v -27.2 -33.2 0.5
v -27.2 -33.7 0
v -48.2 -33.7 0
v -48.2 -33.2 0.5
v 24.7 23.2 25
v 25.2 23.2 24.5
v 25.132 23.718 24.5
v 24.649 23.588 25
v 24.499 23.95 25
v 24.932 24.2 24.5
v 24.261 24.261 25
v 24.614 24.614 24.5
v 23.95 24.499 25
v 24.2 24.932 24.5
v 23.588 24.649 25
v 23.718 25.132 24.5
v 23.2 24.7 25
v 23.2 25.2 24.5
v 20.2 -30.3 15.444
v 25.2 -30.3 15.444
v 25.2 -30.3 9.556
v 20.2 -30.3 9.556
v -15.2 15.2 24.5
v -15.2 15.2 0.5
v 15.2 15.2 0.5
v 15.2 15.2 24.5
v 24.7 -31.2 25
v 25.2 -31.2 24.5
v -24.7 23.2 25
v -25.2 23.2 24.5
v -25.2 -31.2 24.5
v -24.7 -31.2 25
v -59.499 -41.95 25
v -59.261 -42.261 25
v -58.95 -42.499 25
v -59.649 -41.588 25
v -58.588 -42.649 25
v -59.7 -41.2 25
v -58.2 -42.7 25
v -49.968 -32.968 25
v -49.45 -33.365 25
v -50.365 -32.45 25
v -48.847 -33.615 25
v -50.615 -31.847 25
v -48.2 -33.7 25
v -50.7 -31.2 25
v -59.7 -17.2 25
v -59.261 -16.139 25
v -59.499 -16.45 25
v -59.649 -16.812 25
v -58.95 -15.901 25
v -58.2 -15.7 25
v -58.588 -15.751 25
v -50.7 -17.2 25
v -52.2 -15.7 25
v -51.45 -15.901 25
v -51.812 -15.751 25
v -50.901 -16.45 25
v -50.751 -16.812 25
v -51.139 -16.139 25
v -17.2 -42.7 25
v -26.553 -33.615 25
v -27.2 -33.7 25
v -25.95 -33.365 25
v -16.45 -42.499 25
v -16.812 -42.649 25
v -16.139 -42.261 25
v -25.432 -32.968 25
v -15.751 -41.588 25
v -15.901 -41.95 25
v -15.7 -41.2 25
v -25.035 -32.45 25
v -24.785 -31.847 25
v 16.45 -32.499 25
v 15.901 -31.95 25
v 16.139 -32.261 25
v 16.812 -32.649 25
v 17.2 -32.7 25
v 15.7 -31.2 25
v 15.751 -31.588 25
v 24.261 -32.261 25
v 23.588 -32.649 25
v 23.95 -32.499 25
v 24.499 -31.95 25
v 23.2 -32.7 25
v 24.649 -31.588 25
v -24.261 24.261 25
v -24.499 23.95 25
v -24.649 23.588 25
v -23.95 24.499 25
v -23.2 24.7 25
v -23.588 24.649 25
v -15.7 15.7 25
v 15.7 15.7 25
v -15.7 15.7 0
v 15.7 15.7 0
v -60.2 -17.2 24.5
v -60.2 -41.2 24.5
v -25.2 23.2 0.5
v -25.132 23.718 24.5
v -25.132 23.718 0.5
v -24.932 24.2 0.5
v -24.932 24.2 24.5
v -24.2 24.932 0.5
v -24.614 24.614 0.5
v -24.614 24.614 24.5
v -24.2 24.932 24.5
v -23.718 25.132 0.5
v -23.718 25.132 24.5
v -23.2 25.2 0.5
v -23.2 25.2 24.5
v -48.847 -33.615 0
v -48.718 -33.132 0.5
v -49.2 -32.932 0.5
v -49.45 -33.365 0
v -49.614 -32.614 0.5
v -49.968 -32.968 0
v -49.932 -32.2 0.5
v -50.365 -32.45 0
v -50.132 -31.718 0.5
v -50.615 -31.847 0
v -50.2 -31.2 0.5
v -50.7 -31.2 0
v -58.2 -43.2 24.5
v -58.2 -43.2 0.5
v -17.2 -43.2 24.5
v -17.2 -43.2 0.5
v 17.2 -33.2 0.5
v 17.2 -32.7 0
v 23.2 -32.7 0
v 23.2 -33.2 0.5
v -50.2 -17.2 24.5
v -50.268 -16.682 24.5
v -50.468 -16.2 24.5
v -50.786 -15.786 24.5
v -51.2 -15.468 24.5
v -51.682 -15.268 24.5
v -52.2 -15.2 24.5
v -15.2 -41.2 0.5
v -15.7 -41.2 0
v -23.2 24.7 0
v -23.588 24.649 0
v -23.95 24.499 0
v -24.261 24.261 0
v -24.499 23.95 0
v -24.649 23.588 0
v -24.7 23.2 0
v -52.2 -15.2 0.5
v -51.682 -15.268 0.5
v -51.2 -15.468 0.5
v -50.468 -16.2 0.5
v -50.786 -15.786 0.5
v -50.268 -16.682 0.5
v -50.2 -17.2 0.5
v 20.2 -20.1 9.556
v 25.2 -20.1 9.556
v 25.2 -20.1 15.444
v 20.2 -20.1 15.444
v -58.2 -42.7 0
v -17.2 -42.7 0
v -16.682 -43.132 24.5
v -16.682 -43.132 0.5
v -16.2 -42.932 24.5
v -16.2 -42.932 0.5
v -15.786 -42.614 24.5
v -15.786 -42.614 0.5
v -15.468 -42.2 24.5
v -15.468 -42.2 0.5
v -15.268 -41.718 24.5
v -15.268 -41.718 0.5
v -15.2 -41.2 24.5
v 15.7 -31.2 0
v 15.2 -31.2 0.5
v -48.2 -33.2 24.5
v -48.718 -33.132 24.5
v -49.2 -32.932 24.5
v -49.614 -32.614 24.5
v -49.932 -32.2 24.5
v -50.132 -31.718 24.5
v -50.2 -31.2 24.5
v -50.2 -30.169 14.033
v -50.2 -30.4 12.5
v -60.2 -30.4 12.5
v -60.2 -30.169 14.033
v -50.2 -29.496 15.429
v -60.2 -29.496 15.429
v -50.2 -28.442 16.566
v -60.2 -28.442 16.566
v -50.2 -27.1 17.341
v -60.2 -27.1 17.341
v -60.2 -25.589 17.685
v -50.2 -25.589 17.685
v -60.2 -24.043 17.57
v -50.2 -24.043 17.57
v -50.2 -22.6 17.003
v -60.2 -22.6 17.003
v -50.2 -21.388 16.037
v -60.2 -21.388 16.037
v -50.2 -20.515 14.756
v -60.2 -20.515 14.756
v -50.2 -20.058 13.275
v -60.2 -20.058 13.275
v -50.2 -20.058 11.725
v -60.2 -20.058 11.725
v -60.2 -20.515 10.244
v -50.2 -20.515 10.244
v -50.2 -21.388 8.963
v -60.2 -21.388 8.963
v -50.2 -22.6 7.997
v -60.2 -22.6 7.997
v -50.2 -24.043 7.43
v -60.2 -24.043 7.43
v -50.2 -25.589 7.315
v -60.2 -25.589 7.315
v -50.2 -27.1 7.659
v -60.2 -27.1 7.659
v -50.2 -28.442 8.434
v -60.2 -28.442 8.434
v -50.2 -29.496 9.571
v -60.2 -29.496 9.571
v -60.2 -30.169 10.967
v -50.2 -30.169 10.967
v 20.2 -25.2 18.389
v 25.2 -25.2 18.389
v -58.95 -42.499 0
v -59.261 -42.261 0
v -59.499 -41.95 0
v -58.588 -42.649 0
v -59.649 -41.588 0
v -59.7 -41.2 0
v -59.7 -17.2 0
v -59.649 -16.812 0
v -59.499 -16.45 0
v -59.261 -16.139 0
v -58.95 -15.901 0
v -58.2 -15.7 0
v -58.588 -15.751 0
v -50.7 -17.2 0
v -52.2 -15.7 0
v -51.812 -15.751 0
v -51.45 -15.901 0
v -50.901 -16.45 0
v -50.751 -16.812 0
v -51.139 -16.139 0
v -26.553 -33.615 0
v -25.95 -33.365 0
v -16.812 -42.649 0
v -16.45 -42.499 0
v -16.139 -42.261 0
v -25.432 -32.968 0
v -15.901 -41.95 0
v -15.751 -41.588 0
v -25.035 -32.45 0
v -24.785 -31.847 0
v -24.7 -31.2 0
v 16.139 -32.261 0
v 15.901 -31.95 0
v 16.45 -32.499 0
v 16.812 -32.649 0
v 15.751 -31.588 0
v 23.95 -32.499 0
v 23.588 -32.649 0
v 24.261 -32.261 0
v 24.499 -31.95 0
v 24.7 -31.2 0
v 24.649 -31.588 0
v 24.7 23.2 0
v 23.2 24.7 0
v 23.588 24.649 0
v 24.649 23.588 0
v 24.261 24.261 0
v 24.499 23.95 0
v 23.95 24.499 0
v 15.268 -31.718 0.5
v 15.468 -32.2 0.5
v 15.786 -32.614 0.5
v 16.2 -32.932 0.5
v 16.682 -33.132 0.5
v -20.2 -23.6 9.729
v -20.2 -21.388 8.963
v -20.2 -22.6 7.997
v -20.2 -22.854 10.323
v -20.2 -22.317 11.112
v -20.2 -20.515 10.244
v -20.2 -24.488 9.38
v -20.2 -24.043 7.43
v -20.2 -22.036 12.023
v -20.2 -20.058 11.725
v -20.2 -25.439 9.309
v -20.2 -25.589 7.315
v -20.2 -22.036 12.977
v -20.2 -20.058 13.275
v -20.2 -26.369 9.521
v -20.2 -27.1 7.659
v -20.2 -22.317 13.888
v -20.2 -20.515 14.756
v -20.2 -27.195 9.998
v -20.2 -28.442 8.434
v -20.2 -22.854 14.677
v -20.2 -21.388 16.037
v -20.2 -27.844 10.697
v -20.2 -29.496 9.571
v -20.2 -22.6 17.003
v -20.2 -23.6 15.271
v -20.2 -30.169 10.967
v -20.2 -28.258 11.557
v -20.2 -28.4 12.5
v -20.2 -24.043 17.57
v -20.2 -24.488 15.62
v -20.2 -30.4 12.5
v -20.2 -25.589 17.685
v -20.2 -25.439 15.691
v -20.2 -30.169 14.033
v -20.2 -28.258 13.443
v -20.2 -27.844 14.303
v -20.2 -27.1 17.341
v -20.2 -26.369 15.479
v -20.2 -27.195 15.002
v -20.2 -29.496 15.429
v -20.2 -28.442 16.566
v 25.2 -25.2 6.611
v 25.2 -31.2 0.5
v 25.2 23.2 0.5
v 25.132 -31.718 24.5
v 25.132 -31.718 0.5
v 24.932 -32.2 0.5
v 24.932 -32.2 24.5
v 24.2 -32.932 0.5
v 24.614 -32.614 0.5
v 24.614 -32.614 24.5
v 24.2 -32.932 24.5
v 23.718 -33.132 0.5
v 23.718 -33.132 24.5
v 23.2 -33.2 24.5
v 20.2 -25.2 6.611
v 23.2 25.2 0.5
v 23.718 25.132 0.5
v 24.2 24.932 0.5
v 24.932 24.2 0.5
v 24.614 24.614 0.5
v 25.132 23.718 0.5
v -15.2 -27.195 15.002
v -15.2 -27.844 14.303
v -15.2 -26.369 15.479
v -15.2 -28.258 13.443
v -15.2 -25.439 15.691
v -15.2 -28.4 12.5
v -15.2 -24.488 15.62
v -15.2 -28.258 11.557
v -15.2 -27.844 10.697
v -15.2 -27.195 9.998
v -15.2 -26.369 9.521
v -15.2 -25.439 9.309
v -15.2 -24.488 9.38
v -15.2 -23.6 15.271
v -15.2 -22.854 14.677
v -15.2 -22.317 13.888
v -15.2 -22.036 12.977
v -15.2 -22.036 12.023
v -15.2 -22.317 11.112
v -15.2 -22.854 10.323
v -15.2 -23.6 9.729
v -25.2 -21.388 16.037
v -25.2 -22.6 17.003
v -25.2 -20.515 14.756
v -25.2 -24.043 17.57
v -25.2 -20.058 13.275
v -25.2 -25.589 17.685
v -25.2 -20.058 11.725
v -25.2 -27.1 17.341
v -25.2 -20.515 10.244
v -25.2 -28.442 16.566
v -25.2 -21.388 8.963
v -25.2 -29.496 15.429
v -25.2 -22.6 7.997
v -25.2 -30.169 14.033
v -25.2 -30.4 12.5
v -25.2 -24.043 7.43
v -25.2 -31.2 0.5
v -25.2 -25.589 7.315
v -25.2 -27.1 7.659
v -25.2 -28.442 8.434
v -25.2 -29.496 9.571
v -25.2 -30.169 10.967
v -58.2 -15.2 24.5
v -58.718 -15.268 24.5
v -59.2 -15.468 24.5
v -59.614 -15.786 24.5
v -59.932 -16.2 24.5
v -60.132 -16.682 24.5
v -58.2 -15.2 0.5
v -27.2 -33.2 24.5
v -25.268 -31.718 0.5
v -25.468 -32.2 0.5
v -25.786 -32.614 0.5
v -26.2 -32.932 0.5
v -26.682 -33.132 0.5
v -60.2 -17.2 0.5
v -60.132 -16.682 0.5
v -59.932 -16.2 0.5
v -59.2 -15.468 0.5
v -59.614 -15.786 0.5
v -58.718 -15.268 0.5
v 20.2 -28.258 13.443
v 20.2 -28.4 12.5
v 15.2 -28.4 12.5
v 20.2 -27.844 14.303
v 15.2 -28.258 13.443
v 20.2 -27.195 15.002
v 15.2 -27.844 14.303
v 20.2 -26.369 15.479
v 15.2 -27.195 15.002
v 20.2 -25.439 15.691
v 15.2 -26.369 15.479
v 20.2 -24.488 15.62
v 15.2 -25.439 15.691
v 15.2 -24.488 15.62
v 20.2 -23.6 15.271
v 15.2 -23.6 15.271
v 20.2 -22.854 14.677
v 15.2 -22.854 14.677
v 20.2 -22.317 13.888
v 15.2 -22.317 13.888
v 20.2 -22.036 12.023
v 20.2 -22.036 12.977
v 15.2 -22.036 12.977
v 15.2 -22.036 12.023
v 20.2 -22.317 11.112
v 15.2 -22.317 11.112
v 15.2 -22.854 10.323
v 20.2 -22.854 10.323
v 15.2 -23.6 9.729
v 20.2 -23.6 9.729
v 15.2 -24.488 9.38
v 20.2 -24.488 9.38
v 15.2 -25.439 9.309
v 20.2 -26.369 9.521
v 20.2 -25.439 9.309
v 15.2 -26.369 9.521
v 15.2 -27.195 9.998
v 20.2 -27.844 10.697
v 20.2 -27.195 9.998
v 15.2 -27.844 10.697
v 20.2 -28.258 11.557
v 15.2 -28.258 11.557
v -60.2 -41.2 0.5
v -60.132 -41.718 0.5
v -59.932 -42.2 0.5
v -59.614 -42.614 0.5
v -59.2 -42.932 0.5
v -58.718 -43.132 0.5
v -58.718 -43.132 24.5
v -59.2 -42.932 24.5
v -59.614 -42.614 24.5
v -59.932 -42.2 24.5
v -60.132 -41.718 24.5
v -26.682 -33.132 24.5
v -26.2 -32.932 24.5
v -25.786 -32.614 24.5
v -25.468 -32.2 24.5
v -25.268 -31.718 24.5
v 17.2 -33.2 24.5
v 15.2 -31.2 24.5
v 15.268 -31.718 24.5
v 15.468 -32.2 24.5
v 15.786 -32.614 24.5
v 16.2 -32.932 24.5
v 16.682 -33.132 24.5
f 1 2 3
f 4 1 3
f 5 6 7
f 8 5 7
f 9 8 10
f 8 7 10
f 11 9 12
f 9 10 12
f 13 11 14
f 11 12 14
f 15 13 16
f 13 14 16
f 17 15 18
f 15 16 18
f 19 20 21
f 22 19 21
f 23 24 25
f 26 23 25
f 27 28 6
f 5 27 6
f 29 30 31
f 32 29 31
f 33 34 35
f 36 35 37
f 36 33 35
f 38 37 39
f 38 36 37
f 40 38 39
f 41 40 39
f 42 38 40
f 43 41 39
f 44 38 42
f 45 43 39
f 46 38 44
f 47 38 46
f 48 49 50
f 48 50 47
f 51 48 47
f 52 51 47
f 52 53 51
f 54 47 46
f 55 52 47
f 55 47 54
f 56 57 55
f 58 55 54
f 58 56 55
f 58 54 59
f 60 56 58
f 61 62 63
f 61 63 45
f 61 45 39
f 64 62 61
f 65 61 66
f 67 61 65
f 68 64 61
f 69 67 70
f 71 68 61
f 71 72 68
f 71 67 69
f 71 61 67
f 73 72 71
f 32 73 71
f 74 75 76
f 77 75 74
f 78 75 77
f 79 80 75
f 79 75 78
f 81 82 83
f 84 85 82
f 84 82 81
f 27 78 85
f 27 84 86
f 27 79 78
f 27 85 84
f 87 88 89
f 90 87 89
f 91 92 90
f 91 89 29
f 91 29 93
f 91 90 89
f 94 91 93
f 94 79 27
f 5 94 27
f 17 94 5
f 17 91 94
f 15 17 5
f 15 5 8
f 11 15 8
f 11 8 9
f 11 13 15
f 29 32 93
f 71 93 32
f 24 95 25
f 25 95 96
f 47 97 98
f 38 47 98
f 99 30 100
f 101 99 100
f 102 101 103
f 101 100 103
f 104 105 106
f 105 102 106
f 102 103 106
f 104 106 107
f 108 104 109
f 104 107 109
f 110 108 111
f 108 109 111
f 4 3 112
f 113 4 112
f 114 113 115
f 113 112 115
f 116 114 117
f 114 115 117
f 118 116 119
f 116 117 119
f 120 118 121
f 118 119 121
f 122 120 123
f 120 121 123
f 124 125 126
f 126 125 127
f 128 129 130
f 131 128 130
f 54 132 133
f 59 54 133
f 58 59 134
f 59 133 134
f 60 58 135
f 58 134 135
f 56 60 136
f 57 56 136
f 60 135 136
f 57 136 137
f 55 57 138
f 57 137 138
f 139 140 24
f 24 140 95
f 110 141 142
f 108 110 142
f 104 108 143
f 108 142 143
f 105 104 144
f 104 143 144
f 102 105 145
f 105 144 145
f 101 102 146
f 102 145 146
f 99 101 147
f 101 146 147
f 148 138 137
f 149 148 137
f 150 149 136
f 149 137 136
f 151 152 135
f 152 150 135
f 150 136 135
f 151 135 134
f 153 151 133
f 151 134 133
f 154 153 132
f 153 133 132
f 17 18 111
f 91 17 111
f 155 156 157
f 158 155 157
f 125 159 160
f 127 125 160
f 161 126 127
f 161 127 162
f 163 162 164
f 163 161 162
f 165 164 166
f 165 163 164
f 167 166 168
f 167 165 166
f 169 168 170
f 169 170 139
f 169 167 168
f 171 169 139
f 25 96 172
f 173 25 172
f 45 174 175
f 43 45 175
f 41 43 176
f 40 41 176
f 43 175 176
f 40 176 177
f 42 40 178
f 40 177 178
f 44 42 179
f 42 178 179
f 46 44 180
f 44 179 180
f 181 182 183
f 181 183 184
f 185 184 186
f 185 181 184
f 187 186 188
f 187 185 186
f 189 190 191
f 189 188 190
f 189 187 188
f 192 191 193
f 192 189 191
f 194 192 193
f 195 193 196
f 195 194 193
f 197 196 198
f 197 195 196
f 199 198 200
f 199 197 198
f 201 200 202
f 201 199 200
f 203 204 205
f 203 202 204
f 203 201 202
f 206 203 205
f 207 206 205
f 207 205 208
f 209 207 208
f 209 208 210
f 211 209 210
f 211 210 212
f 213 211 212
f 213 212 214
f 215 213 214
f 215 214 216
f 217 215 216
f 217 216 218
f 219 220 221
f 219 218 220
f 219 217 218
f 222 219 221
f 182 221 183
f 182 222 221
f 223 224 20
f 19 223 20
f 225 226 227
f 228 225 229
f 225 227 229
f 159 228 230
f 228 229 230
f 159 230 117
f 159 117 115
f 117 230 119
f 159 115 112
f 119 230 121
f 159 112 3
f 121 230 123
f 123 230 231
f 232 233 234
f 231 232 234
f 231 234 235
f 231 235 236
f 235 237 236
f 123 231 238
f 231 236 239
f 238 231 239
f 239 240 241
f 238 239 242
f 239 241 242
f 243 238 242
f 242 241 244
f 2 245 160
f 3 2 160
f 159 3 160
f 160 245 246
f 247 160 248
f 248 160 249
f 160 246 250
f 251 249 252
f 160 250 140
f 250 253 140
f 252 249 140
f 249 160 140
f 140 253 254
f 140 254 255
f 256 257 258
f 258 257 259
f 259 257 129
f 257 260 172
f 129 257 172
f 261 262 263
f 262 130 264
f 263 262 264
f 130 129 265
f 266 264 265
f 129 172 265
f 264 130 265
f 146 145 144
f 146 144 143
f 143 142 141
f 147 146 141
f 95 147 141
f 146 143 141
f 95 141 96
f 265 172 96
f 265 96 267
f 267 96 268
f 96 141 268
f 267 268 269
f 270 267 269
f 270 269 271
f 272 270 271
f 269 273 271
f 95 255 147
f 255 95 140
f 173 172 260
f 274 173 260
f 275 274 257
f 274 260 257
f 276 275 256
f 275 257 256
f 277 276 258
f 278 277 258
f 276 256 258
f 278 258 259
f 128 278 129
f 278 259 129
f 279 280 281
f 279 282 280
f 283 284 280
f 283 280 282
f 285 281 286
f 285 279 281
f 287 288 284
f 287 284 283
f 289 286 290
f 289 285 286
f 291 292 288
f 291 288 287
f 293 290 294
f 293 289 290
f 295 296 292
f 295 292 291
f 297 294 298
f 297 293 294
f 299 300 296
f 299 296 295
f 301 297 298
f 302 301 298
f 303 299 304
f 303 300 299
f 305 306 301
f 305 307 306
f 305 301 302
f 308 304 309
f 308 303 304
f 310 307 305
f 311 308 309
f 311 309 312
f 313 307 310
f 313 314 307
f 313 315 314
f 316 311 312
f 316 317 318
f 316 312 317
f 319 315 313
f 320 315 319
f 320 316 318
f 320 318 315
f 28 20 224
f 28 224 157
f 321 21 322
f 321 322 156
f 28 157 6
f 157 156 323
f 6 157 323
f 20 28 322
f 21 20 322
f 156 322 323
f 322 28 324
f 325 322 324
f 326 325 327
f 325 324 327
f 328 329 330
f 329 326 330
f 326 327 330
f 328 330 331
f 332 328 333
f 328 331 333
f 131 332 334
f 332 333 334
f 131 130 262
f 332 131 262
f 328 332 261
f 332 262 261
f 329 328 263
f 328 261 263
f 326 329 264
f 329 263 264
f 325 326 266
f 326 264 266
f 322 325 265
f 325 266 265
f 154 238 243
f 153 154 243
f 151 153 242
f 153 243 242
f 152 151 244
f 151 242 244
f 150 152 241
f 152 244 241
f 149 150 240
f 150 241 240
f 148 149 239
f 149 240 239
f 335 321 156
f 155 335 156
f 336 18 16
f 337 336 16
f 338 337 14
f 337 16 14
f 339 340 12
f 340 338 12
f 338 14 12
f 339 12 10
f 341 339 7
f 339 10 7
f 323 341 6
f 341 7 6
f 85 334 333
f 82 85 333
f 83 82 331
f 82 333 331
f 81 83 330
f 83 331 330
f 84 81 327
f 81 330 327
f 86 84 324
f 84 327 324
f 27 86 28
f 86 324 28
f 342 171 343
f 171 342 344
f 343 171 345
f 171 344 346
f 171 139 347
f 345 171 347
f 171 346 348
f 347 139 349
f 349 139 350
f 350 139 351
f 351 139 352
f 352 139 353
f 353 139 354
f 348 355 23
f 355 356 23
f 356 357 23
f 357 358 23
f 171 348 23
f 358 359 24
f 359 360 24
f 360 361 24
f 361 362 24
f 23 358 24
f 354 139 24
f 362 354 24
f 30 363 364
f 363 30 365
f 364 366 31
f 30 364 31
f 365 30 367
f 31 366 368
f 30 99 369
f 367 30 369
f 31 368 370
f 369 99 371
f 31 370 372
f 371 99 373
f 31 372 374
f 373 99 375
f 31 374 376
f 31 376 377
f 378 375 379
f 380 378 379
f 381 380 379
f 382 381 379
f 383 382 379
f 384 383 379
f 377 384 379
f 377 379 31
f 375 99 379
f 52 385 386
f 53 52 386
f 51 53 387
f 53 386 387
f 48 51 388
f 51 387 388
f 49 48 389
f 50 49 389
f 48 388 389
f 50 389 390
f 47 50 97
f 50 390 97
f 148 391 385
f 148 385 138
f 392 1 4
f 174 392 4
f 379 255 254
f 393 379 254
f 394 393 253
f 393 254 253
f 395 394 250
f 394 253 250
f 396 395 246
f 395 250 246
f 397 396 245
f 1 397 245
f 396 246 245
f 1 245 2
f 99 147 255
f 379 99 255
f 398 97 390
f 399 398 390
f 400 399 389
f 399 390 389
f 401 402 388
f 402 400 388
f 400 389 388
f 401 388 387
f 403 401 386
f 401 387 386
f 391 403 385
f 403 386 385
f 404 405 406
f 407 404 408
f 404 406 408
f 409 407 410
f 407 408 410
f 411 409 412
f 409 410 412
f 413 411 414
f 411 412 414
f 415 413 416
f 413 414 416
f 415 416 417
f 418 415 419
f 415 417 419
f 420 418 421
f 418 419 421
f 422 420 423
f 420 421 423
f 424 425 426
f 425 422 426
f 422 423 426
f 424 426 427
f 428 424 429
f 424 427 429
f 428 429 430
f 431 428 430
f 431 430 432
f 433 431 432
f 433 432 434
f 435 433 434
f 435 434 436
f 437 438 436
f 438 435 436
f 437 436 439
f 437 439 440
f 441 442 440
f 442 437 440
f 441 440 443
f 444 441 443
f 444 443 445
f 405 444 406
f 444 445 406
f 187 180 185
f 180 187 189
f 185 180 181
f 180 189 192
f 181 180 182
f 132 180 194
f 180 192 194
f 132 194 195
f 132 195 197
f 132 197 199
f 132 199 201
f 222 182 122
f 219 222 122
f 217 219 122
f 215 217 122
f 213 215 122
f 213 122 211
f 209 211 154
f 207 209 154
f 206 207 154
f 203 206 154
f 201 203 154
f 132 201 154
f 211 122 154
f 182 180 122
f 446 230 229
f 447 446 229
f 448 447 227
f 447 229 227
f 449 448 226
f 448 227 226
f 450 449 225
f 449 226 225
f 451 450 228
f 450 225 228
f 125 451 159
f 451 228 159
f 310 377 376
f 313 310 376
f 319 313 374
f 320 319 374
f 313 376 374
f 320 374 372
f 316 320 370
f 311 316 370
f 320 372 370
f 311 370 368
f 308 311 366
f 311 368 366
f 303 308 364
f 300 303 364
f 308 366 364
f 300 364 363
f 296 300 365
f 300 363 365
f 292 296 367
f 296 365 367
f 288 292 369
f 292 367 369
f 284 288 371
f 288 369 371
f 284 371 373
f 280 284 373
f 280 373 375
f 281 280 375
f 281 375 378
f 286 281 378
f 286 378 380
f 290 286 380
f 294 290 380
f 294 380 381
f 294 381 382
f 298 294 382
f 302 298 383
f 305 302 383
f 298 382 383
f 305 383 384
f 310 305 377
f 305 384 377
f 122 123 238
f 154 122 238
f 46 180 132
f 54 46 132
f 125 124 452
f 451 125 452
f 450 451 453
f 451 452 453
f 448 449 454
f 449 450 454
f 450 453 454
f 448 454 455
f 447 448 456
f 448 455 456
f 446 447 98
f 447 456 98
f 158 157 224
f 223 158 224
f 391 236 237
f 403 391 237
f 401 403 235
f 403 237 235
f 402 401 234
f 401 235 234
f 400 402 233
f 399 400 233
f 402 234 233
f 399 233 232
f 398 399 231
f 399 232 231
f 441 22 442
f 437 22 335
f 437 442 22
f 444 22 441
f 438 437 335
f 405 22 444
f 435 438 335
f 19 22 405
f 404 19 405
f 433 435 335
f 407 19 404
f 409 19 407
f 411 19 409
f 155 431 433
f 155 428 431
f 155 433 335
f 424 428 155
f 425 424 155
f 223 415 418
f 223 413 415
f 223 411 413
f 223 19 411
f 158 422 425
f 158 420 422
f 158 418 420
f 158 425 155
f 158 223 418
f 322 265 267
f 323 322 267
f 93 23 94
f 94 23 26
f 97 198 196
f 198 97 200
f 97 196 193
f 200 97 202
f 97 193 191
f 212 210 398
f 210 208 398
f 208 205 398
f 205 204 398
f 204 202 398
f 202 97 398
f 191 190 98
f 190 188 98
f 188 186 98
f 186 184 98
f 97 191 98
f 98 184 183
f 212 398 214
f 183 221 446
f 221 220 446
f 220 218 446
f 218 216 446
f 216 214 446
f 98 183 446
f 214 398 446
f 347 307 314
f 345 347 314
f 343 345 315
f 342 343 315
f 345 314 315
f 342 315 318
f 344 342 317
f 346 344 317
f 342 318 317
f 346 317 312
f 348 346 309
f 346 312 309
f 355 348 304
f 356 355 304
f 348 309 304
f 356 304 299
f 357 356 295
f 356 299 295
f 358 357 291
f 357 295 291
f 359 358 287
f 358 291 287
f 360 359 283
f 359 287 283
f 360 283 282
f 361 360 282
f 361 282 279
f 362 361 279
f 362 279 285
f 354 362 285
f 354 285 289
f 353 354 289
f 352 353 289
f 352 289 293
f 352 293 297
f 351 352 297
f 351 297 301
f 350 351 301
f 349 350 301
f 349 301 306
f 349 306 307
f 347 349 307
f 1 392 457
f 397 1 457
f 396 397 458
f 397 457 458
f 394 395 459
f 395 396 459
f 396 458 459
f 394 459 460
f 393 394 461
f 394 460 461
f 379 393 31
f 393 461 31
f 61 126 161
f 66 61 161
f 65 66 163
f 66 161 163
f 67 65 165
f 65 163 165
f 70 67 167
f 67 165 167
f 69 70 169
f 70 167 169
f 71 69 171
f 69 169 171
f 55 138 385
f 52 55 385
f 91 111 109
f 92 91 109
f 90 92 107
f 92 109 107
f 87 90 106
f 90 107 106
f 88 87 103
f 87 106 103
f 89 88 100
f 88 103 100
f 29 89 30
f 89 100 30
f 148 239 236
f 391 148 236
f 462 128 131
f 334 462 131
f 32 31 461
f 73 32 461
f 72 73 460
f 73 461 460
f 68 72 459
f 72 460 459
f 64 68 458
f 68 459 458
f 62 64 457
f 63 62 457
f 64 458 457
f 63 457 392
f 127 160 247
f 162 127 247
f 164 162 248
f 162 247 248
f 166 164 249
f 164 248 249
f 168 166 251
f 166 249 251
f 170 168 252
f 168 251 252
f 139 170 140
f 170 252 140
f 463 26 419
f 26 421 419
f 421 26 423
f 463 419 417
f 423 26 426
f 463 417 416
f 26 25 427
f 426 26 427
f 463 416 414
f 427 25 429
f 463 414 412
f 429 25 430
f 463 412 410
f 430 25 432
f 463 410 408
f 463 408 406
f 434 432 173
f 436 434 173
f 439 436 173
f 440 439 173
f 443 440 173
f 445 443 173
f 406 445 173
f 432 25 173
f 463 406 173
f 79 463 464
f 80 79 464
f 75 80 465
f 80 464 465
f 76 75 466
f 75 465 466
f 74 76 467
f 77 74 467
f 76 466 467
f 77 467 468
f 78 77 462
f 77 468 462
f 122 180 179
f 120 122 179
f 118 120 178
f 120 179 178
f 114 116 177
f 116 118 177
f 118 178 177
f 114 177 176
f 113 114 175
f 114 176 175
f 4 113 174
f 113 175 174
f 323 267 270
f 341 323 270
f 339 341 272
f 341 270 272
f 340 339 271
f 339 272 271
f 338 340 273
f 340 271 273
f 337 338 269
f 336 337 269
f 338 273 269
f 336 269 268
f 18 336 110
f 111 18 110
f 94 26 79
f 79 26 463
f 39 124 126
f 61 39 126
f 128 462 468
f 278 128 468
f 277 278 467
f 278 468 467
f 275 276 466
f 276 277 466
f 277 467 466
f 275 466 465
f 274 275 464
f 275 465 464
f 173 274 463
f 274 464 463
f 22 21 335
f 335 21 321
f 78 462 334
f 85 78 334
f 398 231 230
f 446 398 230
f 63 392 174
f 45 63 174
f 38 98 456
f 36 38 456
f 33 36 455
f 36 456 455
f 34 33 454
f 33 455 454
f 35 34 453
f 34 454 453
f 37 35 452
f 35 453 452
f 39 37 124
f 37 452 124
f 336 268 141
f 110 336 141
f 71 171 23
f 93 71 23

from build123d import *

# Parameters (mm, degrees)
F0_W          = 10
F0_H          = 18
F1_DEPTH      = 25
F2_R          = 3.2
F3_DEPTH      = 50.401
F3_DEPTH_BACK = 35.001
F2_R_2        = 5.2
F4_DEPTH      = 5
F4_DEPTH_BACK = 35.001
F5_R          = 3.2
F6_DEPTH      = 5
F7_R          = 2
F8_SIZE       = 0.5


with BuildPart() as f1:
    # F0 (on Top) → F1 (new body)
    with BuildSketch(Plane.XY):
        Polygon((-15.2, 15.2), (15.2, 15.2), (15.2, -33.2), (25.2, -33.2), (25.2, 25.2), (-25.2, 25.2), (-25.2, -33.2), (-15.2, -33.2), align=None)
        Polygon((-15.2, -43.2), (-15.2, -33.2), (-25.2, -33.2), (-50.2, -33.2), (-60.2, -33.2), (-60.2, -43.2), align=None)
        with Locations((-55.2, -24.2)):
            Rectangle(F0_W, F0_H)
    extrude(amount=F1_DEPTH)

    # F2 (on face) → F3 (cut, two sides)
    with BuildSketch(Plane(origin=(-25.2, 0, 0), x_dir=(0, -1, 0), z_dir=(-1, 0, 0))) as f3_sk:
        with Locations((25.2, 12.5)):
            Circle(F2_R)
    extrude(amount=-F3_DEPTH, mode=Mode.SUBTRACT)
    extrude(f3_sk.sketch, amount=F3_DEPTH_BACK, mode=Mode.SUBTRACT)

    # F2 (on face) → F4 (cut, two sides)
    with BuildSketch(Plane(origin=(-25.2, 0, 0), x_dir=(0, -1, 0), z_dir=(-1, 0, 0))) as f4_sk:
        with Locations((25.2, 12.5)):
            Circle(F2_R_2)
        with Locations((25.2, 12.5)):
            Circle(F2_R, mode=Mode.SUBTRACT)
    extrude(amount=-F4_DEPTH, mode=Mode.SUBTRACT)
    extrude(f4_sk.sketch, amount=F4_DEPTH_BACK, mode=Mode.SUBTRACT)

    # F5 (on face) → F6 (cut)
    with BuildSketch(Plane.YZ.offset(25.2)):
        Polygon((-30.3, 9.5555136271), (-25.2, 6.6110272543), (-20.1, 9.5555136271), (-20.1, 15.4444863729), (-25.2, 18.3889727457), (-30.3, 15.4444863729), align=None)
        with Locations((-25.2, 12.5)):
            Circle(F5_R, mode=Mode.SUBTRACT)
    extrude(amount=-F6_DEPTH, mode=Mode.SUBTRACT)

    # F7
    f7_edges = [f1.edges().sort_by_distance(p)[0] for p in [
        (-25.2, -33.2, 12.5),
        (-15.2, -43.2, 12.5),
        (15.2, -33.2, 12.5),
        (25.2, -33.2, 12.5),
        (25.2, 25.2, 12.5),
        (-50.2, -33.2, 12.5),
        (-50.2, -15.2, 12.5),
        (-60.2, -15.2, 12.5),
        (-60.2, -43.2, 12.5),
        (-25.2, 25.2, 12.5),
    ]]
    fillet(f7_edges, radius=F7_R)

    # F8
    f8_edges = [f1.edges().sort_by_distance(p)[0] for p in [
        (15.2, -8, 25),
        (15.785786, -32.614214, 25),
        (0, 15.2, 25),
        (20.2, -33.2, 25),
        (-15.2, -13, 25),
        (24.614214, -32.614214, 25),
        (-15.785786, -42.614214, 25),
        (25.2, -4, 25),
        (-37.7, -43.2, 25),
        (24.614214, 24.614214, 25),
        (-59.614214, -42.614214, 25),
        (0, 25.2, 25),
        (-60.2, -29.2, 25),
        (-24.614214, 24.614214, 25),
        (-59.614214, -15.785786, 25),
        (-25.2, -4, 25),
        (-55.2, -15.2, 25),
        (-25.785786, -32.614214, 25),
        (-50.785786, -15.785786, 25),
        (-37.7, -33.2, 25),
        (-50.2, -24.2, 25),
        (-49.614214, -32.614214, 25),
        (15.2, -8, 0),
        (15.785786, -32.614214, 0),
        (0, 15.2, 0),
        (20.2, -33.2, 0),
        (-15.2, -13, 0),
        (24.614214, -32.614214, 0),
        (-15.785786, -42.614214, 0),
        (25.2, -4, 0),
        (-37.7, -43.2, 0),
        (24.614214, 24.614214, 0),
        (-59.614214, -42.614214, 0),
        (0, 25.2, 0),
        (-60.2, -29.2, 0),
        (-24.614214, 24.614214, 0),
        (-59.614214, -15.785786, 0),
        (-25.2, -4, 0),
        (-55.2, -15.2, 0),
        (-25.785786, -32.614214, 0),
        (-50.785786, -15.785786, 0),
        (-37.7, -33.2, 0),
        (-50.2, -24.2, 0),
        (-49.614214, -32.614214, 0),
    ]]
    chamfer(f8_edges, length=F8_SIZE)


solid = f1.part
